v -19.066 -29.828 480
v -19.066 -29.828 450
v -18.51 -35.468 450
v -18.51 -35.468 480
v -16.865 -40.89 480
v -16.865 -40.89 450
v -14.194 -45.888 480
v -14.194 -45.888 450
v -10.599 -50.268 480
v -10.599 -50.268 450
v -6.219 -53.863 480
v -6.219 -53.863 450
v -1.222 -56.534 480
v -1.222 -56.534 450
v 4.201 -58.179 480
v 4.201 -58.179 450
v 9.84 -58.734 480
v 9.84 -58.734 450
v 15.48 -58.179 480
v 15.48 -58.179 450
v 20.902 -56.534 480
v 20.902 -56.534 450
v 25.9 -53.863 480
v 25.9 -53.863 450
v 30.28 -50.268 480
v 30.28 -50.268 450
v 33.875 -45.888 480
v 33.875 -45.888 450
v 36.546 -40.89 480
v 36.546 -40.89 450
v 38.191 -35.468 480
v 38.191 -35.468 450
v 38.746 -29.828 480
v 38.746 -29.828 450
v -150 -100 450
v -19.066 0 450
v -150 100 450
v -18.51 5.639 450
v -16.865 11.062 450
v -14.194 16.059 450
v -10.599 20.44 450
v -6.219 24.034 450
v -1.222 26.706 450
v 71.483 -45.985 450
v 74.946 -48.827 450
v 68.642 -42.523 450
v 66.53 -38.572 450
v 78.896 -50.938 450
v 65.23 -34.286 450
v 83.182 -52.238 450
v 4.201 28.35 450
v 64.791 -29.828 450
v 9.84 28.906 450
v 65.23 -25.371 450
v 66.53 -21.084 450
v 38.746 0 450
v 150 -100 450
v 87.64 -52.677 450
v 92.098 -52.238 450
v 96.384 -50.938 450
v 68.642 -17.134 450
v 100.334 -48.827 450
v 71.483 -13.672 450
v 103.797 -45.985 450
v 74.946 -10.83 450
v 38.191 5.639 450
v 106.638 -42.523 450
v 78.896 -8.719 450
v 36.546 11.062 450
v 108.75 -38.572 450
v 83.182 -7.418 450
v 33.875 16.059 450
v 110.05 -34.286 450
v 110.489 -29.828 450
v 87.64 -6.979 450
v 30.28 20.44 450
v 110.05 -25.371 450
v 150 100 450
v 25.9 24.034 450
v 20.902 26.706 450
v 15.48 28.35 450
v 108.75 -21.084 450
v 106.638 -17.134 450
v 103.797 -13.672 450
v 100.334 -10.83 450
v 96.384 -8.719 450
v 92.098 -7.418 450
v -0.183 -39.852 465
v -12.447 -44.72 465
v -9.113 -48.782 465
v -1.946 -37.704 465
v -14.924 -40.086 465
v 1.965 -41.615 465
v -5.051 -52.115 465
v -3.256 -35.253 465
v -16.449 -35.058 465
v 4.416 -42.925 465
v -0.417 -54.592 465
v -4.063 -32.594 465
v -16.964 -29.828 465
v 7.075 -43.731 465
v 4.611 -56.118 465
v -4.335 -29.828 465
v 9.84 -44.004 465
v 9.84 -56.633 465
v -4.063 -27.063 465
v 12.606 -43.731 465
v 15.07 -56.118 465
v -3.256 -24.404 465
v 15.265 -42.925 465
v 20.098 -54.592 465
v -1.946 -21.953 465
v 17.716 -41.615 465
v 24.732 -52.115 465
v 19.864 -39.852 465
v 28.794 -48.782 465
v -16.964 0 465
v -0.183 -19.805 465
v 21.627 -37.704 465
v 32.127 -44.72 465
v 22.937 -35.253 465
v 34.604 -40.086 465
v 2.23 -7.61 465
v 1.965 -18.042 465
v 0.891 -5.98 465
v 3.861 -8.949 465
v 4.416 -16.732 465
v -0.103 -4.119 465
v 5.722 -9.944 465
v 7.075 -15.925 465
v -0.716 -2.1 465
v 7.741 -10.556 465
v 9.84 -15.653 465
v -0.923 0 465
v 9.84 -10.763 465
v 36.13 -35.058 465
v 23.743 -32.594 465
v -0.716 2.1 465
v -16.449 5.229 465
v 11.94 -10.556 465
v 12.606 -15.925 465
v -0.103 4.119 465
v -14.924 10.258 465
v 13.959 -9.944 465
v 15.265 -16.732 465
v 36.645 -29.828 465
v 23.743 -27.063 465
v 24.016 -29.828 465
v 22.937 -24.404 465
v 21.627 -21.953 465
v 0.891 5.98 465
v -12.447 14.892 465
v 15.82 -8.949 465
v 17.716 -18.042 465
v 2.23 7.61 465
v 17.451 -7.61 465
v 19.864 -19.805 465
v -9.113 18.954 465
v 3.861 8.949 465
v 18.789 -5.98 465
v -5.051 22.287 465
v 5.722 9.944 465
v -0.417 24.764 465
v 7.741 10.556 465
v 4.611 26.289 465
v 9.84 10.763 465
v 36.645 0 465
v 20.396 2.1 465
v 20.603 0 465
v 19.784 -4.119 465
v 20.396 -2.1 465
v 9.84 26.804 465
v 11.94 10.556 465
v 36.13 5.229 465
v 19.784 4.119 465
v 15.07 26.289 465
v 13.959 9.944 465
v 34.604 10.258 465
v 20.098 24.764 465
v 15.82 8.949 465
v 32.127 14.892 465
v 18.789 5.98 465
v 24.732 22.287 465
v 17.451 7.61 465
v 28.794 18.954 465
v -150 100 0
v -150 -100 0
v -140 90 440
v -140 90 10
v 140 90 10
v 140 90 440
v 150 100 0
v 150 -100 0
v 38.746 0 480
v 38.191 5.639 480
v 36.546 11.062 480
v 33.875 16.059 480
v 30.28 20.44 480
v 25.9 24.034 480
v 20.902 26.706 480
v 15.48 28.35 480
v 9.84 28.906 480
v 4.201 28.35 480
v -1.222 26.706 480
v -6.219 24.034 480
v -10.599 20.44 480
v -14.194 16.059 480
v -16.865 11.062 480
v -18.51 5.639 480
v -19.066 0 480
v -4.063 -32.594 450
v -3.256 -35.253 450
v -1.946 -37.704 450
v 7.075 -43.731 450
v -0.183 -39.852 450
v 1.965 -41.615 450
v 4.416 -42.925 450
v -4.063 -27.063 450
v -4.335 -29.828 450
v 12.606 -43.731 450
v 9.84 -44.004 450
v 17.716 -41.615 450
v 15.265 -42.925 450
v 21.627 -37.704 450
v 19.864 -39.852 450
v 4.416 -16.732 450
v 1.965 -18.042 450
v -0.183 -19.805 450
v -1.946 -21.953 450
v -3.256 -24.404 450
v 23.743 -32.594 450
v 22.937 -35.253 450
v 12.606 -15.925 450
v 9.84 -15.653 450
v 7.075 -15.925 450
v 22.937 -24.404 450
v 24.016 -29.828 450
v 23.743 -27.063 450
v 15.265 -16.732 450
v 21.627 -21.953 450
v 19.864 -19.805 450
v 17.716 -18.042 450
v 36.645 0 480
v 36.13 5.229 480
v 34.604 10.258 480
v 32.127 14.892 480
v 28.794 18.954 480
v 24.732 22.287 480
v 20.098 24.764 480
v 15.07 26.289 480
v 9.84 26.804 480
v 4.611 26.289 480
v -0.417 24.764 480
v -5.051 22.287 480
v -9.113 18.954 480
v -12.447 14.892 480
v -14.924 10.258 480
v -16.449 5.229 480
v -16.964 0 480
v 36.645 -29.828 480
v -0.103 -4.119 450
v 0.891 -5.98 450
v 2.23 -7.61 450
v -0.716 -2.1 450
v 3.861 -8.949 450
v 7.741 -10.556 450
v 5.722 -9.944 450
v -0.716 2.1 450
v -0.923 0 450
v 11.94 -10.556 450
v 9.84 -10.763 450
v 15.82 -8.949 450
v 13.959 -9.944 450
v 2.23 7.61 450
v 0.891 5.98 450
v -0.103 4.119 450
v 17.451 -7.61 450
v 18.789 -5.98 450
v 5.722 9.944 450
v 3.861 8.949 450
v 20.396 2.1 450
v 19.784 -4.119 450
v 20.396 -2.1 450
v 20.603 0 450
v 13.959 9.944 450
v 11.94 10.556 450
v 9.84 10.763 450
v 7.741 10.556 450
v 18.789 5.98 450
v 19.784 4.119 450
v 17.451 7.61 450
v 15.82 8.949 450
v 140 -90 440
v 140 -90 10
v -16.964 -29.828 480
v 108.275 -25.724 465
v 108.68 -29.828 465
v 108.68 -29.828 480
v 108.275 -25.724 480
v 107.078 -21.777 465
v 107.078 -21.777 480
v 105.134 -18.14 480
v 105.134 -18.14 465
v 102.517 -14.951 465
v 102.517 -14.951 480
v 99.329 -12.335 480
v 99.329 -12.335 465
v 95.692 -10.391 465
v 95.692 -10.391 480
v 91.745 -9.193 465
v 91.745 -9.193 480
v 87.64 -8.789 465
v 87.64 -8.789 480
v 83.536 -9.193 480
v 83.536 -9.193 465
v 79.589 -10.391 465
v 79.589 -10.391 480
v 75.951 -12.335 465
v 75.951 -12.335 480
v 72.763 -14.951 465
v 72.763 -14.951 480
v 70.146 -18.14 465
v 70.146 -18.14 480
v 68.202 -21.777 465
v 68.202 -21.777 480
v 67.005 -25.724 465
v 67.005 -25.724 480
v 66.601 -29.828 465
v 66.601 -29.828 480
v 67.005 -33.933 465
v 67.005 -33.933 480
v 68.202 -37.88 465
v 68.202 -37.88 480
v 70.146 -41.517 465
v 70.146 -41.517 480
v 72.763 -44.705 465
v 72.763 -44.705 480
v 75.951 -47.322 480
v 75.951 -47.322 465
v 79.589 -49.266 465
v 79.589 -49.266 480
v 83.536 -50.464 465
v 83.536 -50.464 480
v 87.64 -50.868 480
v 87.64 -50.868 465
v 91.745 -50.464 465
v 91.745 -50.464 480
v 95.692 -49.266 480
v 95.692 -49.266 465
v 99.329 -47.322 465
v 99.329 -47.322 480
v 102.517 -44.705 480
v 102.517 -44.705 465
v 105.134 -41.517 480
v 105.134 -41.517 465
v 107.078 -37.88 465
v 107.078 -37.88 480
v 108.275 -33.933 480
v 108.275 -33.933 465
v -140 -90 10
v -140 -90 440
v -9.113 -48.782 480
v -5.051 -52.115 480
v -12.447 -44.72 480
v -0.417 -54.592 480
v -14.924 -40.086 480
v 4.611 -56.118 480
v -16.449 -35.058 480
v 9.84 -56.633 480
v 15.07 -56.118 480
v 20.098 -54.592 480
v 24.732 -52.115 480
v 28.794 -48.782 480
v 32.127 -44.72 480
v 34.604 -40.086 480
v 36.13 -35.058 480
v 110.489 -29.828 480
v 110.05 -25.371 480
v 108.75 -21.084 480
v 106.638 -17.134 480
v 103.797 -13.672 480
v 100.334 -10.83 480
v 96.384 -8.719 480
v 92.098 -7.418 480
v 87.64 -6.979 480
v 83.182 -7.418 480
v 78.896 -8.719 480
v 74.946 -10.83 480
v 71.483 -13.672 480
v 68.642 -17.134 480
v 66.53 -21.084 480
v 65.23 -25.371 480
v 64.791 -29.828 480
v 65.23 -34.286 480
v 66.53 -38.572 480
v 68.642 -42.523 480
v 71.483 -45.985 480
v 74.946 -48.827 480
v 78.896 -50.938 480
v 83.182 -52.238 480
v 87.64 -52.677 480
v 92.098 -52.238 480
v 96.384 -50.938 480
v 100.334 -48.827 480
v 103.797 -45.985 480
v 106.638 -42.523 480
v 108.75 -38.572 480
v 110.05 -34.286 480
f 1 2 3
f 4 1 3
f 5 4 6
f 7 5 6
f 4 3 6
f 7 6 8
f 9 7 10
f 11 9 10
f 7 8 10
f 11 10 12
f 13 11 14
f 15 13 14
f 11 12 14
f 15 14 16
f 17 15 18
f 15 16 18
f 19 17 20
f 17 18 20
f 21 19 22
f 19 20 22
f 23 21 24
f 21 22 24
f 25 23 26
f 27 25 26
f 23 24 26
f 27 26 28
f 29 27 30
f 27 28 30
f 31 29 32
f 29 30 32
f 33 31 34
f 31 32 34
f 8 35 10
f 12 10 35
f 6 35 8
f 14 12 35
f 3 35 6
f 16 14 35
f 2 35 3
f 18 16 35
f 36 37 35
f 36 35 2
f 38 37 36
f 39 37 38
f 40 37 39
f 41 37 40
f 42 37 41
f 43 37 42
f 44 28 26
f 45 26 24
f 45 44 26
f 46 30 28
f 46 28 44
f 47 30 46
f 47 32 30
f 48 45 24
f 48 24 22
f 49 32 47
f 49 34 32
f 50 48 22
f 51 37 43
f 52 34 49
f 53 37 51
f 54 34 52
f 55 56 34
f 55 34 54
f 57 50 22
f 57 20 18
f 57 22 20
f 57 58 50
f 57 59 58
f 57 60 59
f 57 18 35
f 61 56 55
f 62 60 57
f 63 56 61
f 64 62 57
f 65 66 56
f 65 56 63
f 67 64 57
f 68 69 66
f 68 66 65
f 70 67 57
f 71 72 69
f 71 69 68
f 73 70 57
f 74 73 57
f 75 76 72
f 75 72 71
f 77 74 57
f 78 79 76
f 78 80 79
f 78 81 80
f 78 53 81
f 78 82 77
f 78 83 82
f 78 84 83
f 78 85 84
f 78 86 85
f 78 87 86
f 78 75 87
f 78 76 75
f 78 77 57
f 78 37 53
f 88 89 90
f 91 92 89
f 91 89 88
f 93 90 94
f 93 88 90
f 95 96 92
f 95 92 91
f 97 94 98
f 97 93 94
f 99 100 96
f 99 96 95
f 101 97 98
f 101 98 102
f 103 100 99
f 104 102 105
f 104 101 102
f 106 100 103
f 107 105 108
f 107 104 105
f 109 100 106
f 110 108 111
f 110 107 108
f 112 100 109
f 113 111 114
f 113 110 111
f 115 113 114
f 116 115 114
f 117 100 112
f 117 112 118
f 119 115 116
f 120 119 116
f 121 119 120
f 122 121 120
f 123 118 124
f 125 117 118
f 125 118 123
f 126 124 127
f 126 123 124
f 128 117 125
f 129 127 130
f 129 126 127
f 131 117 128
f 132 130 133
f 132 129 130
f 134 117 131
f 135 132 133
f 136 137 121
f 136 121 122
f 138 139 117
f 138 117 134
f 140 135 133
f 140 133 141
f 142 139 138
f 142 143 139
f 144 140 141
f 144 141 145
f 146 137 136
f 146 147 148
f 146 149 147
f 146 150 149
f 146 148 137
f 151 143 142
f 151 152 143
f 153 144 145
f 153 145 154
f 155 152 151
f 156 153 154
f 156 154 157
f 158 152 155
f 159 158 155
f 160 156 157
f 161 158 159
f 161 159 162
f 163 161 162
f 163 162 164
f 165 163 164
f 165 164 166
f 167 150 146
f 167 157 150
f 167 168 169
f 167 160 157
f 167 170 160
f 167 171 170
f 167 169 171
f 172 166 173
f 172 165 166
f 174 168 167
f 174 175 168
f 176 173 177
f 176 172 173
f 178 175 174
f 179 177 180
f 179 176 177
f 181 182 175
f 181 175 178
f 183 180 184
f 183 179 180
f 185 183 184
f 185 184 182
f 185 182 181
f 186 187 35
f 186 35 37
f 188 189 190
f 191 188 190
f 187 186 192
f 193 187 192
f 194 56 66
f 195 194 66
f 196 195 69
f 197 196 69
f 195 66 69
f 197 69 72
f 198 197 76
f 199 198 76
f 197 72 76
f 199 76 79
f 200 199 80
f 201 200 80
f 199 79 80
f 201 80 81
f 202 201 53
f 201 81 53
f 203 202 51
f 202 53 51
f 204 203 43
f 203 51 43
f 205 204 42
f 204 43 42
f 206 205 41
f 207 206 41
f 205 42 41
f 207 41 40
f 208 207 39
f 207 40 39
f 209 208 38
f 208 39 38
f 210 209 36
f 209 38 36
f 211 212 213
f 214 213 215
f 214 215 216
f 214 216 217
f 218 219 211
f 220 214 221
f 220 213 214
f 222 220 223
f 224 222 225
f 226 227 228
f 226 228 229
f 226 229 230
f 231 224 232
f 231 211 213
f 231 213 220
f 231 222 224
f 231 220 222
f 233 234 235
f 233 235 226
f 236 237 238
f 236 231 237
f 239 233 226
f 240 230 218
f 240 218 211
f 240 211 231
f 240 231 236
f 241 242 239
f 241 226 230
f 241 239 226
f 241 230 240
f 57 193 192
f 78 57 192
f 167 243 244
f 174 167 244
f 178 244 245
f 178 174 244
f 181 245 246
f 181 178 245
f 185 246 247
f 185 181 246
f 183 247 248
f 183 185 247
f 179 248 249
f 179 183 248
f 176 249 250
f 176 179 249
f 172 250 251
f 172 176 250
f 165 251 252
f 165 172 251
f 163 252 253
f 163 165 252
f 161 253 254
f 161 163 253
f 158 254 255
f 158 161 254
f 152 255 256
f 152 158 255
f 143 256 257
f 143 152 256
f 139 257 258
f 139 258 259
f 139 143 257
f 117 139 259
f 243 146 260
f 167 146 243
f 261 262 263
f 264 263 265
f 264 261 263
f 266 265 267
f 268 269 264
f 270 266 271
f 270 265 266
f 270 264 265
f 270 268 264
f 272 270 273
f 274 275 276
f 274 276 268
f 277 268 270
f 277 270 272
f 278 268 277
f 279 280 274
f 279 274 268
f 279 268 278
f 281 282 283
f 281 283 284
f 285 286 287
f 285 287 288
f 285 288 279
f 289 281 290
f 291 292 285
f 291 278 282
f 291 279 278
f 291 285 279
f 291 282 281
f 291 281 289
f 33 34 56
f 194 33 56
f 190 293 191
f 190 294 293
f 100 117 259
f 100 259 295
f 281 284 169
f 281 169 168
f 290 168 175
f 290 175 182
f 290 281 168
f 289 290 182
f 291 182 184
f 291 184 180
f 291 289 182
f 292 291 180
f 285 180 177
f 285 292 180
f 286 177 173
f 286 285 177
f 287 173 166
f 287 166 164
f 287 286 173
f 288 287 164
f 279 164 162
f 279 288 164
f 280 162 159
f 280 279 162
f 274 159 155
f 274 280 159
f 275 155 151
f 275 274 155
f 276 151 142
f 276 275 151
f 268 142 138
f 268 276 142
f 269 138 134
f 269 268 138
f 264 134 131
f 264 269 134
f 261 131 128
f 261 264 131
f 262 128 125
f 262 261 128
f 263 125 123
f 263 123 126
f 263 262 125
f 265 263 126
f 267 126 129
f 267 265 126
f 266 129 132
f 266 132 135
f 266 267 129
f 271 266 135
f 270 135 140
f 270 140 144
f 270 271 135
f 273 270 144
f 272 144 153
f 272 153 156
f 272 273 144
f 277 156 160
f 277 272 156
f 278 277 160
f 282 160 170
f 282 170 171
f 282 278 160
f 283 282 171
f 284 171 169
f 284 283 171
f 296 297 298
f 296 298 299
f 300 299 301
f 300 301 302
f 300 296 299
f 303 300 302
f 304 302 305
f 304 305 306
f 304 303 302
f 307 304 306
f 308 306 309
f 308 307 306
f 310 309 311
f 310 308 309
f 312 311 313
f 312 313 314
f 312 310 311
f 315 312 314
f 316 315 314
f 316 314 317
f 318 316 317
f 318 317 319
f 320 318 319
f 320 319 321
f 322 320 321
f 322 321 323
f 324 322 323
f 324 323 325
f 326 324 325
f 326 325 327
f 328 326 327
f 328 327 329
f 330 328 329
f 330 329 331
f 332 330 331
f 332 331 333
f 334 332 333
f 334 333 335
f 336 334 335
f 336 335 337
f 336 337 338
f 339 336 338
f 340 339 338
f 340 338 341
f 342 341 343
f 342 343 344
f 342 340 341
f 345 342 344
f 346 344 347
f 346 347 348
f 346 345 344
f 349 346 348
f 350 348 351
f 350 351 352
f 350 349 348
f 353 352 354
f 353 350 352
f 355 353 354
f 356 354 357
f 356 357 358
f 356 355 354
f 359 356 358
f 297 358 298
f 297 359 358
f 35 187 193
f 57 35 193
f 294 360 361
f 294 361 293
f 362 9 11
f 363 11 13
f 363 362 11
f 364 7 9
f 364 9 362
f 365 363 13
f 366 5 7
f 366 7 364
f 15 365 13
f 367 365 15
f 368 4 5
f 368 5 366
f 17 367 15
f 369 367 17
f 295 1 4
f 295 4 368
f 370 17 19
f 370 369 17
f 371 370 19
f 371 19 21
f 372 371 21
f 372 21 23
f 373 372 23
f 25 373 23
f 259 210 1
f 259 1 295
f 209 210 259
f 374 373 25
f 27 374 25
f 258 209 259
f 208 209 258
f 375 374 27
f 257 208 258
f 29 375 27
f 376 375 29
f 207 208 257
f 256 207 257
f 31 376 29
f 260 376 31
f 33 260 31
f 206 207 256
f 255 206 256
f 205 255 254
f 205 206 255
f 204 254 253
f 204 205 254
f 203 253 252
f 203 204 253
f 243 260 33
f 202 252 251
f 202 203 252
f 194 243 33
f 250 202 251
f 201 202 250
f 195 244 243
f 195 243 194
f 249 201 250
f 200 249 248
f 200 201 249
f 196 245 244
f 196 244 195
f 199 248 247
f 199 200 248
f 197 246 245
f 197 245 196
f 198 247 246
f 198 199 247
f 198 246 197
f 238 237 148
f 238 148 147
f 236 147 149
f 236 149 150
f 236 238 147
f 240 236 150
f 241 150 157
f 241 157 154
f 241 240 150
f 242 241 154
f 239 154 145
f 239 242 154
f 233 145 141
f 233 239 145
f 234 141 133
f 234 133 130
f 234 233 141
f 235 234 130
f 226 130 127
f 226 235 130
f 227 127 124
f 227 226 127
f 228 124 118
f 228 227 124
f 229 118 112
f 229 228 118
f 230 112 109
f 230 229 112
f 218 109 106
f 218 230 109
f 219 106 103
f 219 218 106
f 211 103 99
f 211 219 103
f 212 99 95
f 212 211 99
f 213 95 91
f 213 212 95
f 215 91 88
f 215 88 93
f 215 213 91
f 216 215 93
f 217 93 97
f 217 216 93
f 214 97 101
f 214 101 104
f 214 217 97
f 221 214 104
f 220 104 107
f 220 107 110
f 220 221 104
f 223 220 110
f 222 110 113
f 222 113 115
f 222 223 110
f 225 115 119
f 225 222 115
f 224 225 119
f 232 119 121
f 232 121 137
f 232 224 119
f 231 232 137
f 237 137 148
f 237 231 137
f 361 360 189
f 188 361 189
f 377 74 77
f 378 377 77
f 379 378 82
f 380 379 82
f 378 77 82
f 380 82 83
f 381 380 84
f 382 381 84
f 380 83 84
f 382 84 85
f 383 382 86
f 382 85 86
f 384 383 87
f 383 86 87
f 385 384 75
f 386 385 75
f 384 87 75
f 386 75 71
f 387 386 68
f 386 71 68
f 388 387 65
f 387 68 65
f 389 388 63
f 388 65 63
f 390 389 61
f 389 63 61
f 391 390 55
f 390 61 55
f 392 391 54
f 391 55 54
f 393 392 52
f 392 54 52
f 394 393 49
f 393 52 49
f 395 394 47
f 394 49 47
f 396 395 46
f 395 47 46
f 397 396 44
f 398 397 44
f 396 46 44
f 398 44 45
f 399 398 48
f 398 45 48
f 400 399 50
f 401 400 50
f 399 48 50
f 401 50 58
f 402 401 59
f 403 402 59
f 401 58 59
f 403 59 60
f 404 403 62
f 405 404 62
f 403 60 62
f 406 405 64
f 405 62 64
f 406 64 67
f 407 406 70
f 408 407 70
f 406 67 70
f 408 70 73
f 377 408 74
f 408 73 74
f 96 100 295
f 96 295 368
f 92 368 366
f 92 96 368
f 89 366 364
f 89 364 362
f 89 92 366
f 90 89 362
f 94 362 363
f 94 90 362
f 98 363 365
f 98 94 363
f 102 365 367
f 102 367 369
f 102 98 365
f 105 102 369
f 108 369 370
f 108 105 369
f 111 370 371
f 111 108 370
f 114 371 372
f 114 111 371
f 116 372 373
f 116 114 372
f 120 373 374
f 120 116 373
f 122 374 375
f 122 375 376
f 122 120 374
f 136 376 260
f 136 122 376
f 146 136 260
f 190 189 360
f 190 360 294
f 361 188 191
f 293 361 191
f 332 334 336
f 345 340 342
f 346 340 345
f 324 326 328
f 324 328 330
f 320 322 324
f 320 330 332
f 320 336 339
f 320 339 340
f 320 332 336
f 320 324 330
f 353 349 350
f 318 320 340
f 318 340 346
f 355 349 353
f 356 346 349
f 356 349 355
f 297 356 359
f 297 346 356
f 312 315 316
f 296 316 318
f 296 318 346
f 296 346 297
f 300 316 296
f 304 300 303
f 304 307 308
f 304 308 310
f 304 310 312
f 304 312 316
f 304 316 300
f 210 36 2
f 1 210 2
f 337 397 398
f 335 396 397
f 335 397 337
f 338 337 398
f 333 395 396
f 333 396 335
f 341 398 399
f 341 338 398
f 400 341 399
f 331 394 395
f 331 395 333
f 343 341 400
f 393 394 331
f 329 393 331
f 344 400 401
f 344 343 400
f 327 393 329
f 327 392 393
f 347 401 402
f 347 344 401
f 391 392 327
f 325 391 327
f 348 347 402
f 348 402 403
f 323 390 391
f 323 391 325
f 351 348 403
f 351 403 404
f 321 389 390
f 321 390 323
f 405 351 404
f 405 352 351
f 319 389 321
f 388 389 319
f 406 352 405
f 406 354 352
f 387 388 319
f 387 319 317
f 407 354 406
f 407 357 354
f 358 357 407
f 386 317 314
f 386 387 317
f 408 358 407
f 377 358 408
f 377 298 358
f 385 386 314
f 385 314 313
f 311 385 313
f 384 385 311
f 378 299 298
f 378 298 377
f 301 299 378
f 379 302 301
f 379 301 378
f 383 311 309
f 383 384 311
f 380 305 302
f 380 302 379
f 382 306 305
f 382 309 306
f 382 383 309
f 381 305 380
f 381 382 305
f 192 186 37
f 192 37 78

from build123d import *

# Parameters (mm, degrees)
SKETCH1_W           = 300
SKETCH1_H           = 200
BOSS_EXTRUDE1_DEPTH = 450
SHELL1_T            = 10
SKETCH2_R           = 22.84898586
SKETCH2_R_2         = 21.039403667
BOSS_EXTRUDE2_DEPTH = 30
SKETCH5_R           = 10.76282056
SKETCH5_R_2         = 14.175471805
BOSS_EXTRUDE3_DEPTH = 15
SKETCH6_R           = 21.039403667
BOSS_EXTRUDE4_DEPTH = 15


with BuildPart() as part:
    # Sketch1 → Boss-Extrude1 (new body)
    with BuildSketch(Plane.XY):
        Rectangle(SKETCH1_W, SKETCH1_H)
    extrude(amount=BOSS_EXTRUDE1_DEPTH)

    # Shell1 (no face opened: a closed hollow body)
    add(offset(amount=-SHELL1_T, mode=Mode.PRIVATE), mode=Mode.SUBTRACT)

    # Sketch2 → Boss-Extrude2 (add)
    # profile 1 of 2: a face of its own
    with BuildSketch(Plane.XY.offset(450)):
        with Locations((87.640110274, -29.828388409)):
            Circle(SKETCH2_R)
        with Locations((87.640110274, -29.828388409)):
            Circle(SKETCH2_R_2, mode=Mode.SUBTRACT)
    # profile 2 of 2: a face of its own
    with BuildSketch(Plane.XY.offset(450)):
        with BuildLine():
            Line((-19.065567849, 0), (-19.065567849, -29.828388409))
            ThreePointArc((-19.065567849, -29.828388409), (9.840293083, -58.734249341), (38.746154016, -29.828388409))
            Line((38.746154016, -29.828388409), (38.746154016, 0))
            ThreePointArc((38.746154016, 0), (9.840293083, 28.905860932), (-19.065567849, 0))
        make_face()
        with BuildLine():
            Line((-16.964069854, 0), (-16.964069854, -29.828388409))
            ThreePointArc((-16.964069854, -29.828388409), (9.840293083, -56.632751347), (36.644656021, -29.828388409))
            Line((36.644656021, -29.828388409), (36.644656021, 0))
            ThreePointArc((36.644656021, 0), (9.840293083, 26.804362938), (-16.964069854, 0))
        make_face(mode=Mode.SUBTRACT)
    extrude(amount=BOSS_EXTRUDE2_DEPTH)

    # Sketch5 → Boss-Extrude3 (add)
    with BuildSketch(Plane.XY.offset(450)):
        with BuildLine():
            Line((-16.964069854, 0), (-16.964069854, -29.828388409))
            ThreePointArc((-16.964069854, -29.828388409), (9.840293083, -56.632751347), (36.644656021, -29.828388409))
            Line((36.644656021, -29.828388409), (36.644656021, 0))
            ThreePointArc((36.644656021, 0), (9.840293083, 26.804362938), (-16.964069854, 0))
        make_face()
        with Locations((9.840293083, 0)):
            Circle(SKETCH5_R, mode=Mode.SUBTRACT)
        with Locations((9.840293083, -29.828388409)):
            Circle(SKETCH5_R_2, mode=Mode.SUBTRACT)
    extrude(amount=BOSS_EXTRUDE3_DEPTH)

    # Sketch6 → Boss-Extrude4 (add)
    with BuildSketch(Plane.XY.offset(450)):
        with Locations((87.640110274, -29.828388409)):
            Circle(SKETCH6_R)
    extrude(amount=BOSS_EXTRUDE4_DEPTH)


solid = part.part
